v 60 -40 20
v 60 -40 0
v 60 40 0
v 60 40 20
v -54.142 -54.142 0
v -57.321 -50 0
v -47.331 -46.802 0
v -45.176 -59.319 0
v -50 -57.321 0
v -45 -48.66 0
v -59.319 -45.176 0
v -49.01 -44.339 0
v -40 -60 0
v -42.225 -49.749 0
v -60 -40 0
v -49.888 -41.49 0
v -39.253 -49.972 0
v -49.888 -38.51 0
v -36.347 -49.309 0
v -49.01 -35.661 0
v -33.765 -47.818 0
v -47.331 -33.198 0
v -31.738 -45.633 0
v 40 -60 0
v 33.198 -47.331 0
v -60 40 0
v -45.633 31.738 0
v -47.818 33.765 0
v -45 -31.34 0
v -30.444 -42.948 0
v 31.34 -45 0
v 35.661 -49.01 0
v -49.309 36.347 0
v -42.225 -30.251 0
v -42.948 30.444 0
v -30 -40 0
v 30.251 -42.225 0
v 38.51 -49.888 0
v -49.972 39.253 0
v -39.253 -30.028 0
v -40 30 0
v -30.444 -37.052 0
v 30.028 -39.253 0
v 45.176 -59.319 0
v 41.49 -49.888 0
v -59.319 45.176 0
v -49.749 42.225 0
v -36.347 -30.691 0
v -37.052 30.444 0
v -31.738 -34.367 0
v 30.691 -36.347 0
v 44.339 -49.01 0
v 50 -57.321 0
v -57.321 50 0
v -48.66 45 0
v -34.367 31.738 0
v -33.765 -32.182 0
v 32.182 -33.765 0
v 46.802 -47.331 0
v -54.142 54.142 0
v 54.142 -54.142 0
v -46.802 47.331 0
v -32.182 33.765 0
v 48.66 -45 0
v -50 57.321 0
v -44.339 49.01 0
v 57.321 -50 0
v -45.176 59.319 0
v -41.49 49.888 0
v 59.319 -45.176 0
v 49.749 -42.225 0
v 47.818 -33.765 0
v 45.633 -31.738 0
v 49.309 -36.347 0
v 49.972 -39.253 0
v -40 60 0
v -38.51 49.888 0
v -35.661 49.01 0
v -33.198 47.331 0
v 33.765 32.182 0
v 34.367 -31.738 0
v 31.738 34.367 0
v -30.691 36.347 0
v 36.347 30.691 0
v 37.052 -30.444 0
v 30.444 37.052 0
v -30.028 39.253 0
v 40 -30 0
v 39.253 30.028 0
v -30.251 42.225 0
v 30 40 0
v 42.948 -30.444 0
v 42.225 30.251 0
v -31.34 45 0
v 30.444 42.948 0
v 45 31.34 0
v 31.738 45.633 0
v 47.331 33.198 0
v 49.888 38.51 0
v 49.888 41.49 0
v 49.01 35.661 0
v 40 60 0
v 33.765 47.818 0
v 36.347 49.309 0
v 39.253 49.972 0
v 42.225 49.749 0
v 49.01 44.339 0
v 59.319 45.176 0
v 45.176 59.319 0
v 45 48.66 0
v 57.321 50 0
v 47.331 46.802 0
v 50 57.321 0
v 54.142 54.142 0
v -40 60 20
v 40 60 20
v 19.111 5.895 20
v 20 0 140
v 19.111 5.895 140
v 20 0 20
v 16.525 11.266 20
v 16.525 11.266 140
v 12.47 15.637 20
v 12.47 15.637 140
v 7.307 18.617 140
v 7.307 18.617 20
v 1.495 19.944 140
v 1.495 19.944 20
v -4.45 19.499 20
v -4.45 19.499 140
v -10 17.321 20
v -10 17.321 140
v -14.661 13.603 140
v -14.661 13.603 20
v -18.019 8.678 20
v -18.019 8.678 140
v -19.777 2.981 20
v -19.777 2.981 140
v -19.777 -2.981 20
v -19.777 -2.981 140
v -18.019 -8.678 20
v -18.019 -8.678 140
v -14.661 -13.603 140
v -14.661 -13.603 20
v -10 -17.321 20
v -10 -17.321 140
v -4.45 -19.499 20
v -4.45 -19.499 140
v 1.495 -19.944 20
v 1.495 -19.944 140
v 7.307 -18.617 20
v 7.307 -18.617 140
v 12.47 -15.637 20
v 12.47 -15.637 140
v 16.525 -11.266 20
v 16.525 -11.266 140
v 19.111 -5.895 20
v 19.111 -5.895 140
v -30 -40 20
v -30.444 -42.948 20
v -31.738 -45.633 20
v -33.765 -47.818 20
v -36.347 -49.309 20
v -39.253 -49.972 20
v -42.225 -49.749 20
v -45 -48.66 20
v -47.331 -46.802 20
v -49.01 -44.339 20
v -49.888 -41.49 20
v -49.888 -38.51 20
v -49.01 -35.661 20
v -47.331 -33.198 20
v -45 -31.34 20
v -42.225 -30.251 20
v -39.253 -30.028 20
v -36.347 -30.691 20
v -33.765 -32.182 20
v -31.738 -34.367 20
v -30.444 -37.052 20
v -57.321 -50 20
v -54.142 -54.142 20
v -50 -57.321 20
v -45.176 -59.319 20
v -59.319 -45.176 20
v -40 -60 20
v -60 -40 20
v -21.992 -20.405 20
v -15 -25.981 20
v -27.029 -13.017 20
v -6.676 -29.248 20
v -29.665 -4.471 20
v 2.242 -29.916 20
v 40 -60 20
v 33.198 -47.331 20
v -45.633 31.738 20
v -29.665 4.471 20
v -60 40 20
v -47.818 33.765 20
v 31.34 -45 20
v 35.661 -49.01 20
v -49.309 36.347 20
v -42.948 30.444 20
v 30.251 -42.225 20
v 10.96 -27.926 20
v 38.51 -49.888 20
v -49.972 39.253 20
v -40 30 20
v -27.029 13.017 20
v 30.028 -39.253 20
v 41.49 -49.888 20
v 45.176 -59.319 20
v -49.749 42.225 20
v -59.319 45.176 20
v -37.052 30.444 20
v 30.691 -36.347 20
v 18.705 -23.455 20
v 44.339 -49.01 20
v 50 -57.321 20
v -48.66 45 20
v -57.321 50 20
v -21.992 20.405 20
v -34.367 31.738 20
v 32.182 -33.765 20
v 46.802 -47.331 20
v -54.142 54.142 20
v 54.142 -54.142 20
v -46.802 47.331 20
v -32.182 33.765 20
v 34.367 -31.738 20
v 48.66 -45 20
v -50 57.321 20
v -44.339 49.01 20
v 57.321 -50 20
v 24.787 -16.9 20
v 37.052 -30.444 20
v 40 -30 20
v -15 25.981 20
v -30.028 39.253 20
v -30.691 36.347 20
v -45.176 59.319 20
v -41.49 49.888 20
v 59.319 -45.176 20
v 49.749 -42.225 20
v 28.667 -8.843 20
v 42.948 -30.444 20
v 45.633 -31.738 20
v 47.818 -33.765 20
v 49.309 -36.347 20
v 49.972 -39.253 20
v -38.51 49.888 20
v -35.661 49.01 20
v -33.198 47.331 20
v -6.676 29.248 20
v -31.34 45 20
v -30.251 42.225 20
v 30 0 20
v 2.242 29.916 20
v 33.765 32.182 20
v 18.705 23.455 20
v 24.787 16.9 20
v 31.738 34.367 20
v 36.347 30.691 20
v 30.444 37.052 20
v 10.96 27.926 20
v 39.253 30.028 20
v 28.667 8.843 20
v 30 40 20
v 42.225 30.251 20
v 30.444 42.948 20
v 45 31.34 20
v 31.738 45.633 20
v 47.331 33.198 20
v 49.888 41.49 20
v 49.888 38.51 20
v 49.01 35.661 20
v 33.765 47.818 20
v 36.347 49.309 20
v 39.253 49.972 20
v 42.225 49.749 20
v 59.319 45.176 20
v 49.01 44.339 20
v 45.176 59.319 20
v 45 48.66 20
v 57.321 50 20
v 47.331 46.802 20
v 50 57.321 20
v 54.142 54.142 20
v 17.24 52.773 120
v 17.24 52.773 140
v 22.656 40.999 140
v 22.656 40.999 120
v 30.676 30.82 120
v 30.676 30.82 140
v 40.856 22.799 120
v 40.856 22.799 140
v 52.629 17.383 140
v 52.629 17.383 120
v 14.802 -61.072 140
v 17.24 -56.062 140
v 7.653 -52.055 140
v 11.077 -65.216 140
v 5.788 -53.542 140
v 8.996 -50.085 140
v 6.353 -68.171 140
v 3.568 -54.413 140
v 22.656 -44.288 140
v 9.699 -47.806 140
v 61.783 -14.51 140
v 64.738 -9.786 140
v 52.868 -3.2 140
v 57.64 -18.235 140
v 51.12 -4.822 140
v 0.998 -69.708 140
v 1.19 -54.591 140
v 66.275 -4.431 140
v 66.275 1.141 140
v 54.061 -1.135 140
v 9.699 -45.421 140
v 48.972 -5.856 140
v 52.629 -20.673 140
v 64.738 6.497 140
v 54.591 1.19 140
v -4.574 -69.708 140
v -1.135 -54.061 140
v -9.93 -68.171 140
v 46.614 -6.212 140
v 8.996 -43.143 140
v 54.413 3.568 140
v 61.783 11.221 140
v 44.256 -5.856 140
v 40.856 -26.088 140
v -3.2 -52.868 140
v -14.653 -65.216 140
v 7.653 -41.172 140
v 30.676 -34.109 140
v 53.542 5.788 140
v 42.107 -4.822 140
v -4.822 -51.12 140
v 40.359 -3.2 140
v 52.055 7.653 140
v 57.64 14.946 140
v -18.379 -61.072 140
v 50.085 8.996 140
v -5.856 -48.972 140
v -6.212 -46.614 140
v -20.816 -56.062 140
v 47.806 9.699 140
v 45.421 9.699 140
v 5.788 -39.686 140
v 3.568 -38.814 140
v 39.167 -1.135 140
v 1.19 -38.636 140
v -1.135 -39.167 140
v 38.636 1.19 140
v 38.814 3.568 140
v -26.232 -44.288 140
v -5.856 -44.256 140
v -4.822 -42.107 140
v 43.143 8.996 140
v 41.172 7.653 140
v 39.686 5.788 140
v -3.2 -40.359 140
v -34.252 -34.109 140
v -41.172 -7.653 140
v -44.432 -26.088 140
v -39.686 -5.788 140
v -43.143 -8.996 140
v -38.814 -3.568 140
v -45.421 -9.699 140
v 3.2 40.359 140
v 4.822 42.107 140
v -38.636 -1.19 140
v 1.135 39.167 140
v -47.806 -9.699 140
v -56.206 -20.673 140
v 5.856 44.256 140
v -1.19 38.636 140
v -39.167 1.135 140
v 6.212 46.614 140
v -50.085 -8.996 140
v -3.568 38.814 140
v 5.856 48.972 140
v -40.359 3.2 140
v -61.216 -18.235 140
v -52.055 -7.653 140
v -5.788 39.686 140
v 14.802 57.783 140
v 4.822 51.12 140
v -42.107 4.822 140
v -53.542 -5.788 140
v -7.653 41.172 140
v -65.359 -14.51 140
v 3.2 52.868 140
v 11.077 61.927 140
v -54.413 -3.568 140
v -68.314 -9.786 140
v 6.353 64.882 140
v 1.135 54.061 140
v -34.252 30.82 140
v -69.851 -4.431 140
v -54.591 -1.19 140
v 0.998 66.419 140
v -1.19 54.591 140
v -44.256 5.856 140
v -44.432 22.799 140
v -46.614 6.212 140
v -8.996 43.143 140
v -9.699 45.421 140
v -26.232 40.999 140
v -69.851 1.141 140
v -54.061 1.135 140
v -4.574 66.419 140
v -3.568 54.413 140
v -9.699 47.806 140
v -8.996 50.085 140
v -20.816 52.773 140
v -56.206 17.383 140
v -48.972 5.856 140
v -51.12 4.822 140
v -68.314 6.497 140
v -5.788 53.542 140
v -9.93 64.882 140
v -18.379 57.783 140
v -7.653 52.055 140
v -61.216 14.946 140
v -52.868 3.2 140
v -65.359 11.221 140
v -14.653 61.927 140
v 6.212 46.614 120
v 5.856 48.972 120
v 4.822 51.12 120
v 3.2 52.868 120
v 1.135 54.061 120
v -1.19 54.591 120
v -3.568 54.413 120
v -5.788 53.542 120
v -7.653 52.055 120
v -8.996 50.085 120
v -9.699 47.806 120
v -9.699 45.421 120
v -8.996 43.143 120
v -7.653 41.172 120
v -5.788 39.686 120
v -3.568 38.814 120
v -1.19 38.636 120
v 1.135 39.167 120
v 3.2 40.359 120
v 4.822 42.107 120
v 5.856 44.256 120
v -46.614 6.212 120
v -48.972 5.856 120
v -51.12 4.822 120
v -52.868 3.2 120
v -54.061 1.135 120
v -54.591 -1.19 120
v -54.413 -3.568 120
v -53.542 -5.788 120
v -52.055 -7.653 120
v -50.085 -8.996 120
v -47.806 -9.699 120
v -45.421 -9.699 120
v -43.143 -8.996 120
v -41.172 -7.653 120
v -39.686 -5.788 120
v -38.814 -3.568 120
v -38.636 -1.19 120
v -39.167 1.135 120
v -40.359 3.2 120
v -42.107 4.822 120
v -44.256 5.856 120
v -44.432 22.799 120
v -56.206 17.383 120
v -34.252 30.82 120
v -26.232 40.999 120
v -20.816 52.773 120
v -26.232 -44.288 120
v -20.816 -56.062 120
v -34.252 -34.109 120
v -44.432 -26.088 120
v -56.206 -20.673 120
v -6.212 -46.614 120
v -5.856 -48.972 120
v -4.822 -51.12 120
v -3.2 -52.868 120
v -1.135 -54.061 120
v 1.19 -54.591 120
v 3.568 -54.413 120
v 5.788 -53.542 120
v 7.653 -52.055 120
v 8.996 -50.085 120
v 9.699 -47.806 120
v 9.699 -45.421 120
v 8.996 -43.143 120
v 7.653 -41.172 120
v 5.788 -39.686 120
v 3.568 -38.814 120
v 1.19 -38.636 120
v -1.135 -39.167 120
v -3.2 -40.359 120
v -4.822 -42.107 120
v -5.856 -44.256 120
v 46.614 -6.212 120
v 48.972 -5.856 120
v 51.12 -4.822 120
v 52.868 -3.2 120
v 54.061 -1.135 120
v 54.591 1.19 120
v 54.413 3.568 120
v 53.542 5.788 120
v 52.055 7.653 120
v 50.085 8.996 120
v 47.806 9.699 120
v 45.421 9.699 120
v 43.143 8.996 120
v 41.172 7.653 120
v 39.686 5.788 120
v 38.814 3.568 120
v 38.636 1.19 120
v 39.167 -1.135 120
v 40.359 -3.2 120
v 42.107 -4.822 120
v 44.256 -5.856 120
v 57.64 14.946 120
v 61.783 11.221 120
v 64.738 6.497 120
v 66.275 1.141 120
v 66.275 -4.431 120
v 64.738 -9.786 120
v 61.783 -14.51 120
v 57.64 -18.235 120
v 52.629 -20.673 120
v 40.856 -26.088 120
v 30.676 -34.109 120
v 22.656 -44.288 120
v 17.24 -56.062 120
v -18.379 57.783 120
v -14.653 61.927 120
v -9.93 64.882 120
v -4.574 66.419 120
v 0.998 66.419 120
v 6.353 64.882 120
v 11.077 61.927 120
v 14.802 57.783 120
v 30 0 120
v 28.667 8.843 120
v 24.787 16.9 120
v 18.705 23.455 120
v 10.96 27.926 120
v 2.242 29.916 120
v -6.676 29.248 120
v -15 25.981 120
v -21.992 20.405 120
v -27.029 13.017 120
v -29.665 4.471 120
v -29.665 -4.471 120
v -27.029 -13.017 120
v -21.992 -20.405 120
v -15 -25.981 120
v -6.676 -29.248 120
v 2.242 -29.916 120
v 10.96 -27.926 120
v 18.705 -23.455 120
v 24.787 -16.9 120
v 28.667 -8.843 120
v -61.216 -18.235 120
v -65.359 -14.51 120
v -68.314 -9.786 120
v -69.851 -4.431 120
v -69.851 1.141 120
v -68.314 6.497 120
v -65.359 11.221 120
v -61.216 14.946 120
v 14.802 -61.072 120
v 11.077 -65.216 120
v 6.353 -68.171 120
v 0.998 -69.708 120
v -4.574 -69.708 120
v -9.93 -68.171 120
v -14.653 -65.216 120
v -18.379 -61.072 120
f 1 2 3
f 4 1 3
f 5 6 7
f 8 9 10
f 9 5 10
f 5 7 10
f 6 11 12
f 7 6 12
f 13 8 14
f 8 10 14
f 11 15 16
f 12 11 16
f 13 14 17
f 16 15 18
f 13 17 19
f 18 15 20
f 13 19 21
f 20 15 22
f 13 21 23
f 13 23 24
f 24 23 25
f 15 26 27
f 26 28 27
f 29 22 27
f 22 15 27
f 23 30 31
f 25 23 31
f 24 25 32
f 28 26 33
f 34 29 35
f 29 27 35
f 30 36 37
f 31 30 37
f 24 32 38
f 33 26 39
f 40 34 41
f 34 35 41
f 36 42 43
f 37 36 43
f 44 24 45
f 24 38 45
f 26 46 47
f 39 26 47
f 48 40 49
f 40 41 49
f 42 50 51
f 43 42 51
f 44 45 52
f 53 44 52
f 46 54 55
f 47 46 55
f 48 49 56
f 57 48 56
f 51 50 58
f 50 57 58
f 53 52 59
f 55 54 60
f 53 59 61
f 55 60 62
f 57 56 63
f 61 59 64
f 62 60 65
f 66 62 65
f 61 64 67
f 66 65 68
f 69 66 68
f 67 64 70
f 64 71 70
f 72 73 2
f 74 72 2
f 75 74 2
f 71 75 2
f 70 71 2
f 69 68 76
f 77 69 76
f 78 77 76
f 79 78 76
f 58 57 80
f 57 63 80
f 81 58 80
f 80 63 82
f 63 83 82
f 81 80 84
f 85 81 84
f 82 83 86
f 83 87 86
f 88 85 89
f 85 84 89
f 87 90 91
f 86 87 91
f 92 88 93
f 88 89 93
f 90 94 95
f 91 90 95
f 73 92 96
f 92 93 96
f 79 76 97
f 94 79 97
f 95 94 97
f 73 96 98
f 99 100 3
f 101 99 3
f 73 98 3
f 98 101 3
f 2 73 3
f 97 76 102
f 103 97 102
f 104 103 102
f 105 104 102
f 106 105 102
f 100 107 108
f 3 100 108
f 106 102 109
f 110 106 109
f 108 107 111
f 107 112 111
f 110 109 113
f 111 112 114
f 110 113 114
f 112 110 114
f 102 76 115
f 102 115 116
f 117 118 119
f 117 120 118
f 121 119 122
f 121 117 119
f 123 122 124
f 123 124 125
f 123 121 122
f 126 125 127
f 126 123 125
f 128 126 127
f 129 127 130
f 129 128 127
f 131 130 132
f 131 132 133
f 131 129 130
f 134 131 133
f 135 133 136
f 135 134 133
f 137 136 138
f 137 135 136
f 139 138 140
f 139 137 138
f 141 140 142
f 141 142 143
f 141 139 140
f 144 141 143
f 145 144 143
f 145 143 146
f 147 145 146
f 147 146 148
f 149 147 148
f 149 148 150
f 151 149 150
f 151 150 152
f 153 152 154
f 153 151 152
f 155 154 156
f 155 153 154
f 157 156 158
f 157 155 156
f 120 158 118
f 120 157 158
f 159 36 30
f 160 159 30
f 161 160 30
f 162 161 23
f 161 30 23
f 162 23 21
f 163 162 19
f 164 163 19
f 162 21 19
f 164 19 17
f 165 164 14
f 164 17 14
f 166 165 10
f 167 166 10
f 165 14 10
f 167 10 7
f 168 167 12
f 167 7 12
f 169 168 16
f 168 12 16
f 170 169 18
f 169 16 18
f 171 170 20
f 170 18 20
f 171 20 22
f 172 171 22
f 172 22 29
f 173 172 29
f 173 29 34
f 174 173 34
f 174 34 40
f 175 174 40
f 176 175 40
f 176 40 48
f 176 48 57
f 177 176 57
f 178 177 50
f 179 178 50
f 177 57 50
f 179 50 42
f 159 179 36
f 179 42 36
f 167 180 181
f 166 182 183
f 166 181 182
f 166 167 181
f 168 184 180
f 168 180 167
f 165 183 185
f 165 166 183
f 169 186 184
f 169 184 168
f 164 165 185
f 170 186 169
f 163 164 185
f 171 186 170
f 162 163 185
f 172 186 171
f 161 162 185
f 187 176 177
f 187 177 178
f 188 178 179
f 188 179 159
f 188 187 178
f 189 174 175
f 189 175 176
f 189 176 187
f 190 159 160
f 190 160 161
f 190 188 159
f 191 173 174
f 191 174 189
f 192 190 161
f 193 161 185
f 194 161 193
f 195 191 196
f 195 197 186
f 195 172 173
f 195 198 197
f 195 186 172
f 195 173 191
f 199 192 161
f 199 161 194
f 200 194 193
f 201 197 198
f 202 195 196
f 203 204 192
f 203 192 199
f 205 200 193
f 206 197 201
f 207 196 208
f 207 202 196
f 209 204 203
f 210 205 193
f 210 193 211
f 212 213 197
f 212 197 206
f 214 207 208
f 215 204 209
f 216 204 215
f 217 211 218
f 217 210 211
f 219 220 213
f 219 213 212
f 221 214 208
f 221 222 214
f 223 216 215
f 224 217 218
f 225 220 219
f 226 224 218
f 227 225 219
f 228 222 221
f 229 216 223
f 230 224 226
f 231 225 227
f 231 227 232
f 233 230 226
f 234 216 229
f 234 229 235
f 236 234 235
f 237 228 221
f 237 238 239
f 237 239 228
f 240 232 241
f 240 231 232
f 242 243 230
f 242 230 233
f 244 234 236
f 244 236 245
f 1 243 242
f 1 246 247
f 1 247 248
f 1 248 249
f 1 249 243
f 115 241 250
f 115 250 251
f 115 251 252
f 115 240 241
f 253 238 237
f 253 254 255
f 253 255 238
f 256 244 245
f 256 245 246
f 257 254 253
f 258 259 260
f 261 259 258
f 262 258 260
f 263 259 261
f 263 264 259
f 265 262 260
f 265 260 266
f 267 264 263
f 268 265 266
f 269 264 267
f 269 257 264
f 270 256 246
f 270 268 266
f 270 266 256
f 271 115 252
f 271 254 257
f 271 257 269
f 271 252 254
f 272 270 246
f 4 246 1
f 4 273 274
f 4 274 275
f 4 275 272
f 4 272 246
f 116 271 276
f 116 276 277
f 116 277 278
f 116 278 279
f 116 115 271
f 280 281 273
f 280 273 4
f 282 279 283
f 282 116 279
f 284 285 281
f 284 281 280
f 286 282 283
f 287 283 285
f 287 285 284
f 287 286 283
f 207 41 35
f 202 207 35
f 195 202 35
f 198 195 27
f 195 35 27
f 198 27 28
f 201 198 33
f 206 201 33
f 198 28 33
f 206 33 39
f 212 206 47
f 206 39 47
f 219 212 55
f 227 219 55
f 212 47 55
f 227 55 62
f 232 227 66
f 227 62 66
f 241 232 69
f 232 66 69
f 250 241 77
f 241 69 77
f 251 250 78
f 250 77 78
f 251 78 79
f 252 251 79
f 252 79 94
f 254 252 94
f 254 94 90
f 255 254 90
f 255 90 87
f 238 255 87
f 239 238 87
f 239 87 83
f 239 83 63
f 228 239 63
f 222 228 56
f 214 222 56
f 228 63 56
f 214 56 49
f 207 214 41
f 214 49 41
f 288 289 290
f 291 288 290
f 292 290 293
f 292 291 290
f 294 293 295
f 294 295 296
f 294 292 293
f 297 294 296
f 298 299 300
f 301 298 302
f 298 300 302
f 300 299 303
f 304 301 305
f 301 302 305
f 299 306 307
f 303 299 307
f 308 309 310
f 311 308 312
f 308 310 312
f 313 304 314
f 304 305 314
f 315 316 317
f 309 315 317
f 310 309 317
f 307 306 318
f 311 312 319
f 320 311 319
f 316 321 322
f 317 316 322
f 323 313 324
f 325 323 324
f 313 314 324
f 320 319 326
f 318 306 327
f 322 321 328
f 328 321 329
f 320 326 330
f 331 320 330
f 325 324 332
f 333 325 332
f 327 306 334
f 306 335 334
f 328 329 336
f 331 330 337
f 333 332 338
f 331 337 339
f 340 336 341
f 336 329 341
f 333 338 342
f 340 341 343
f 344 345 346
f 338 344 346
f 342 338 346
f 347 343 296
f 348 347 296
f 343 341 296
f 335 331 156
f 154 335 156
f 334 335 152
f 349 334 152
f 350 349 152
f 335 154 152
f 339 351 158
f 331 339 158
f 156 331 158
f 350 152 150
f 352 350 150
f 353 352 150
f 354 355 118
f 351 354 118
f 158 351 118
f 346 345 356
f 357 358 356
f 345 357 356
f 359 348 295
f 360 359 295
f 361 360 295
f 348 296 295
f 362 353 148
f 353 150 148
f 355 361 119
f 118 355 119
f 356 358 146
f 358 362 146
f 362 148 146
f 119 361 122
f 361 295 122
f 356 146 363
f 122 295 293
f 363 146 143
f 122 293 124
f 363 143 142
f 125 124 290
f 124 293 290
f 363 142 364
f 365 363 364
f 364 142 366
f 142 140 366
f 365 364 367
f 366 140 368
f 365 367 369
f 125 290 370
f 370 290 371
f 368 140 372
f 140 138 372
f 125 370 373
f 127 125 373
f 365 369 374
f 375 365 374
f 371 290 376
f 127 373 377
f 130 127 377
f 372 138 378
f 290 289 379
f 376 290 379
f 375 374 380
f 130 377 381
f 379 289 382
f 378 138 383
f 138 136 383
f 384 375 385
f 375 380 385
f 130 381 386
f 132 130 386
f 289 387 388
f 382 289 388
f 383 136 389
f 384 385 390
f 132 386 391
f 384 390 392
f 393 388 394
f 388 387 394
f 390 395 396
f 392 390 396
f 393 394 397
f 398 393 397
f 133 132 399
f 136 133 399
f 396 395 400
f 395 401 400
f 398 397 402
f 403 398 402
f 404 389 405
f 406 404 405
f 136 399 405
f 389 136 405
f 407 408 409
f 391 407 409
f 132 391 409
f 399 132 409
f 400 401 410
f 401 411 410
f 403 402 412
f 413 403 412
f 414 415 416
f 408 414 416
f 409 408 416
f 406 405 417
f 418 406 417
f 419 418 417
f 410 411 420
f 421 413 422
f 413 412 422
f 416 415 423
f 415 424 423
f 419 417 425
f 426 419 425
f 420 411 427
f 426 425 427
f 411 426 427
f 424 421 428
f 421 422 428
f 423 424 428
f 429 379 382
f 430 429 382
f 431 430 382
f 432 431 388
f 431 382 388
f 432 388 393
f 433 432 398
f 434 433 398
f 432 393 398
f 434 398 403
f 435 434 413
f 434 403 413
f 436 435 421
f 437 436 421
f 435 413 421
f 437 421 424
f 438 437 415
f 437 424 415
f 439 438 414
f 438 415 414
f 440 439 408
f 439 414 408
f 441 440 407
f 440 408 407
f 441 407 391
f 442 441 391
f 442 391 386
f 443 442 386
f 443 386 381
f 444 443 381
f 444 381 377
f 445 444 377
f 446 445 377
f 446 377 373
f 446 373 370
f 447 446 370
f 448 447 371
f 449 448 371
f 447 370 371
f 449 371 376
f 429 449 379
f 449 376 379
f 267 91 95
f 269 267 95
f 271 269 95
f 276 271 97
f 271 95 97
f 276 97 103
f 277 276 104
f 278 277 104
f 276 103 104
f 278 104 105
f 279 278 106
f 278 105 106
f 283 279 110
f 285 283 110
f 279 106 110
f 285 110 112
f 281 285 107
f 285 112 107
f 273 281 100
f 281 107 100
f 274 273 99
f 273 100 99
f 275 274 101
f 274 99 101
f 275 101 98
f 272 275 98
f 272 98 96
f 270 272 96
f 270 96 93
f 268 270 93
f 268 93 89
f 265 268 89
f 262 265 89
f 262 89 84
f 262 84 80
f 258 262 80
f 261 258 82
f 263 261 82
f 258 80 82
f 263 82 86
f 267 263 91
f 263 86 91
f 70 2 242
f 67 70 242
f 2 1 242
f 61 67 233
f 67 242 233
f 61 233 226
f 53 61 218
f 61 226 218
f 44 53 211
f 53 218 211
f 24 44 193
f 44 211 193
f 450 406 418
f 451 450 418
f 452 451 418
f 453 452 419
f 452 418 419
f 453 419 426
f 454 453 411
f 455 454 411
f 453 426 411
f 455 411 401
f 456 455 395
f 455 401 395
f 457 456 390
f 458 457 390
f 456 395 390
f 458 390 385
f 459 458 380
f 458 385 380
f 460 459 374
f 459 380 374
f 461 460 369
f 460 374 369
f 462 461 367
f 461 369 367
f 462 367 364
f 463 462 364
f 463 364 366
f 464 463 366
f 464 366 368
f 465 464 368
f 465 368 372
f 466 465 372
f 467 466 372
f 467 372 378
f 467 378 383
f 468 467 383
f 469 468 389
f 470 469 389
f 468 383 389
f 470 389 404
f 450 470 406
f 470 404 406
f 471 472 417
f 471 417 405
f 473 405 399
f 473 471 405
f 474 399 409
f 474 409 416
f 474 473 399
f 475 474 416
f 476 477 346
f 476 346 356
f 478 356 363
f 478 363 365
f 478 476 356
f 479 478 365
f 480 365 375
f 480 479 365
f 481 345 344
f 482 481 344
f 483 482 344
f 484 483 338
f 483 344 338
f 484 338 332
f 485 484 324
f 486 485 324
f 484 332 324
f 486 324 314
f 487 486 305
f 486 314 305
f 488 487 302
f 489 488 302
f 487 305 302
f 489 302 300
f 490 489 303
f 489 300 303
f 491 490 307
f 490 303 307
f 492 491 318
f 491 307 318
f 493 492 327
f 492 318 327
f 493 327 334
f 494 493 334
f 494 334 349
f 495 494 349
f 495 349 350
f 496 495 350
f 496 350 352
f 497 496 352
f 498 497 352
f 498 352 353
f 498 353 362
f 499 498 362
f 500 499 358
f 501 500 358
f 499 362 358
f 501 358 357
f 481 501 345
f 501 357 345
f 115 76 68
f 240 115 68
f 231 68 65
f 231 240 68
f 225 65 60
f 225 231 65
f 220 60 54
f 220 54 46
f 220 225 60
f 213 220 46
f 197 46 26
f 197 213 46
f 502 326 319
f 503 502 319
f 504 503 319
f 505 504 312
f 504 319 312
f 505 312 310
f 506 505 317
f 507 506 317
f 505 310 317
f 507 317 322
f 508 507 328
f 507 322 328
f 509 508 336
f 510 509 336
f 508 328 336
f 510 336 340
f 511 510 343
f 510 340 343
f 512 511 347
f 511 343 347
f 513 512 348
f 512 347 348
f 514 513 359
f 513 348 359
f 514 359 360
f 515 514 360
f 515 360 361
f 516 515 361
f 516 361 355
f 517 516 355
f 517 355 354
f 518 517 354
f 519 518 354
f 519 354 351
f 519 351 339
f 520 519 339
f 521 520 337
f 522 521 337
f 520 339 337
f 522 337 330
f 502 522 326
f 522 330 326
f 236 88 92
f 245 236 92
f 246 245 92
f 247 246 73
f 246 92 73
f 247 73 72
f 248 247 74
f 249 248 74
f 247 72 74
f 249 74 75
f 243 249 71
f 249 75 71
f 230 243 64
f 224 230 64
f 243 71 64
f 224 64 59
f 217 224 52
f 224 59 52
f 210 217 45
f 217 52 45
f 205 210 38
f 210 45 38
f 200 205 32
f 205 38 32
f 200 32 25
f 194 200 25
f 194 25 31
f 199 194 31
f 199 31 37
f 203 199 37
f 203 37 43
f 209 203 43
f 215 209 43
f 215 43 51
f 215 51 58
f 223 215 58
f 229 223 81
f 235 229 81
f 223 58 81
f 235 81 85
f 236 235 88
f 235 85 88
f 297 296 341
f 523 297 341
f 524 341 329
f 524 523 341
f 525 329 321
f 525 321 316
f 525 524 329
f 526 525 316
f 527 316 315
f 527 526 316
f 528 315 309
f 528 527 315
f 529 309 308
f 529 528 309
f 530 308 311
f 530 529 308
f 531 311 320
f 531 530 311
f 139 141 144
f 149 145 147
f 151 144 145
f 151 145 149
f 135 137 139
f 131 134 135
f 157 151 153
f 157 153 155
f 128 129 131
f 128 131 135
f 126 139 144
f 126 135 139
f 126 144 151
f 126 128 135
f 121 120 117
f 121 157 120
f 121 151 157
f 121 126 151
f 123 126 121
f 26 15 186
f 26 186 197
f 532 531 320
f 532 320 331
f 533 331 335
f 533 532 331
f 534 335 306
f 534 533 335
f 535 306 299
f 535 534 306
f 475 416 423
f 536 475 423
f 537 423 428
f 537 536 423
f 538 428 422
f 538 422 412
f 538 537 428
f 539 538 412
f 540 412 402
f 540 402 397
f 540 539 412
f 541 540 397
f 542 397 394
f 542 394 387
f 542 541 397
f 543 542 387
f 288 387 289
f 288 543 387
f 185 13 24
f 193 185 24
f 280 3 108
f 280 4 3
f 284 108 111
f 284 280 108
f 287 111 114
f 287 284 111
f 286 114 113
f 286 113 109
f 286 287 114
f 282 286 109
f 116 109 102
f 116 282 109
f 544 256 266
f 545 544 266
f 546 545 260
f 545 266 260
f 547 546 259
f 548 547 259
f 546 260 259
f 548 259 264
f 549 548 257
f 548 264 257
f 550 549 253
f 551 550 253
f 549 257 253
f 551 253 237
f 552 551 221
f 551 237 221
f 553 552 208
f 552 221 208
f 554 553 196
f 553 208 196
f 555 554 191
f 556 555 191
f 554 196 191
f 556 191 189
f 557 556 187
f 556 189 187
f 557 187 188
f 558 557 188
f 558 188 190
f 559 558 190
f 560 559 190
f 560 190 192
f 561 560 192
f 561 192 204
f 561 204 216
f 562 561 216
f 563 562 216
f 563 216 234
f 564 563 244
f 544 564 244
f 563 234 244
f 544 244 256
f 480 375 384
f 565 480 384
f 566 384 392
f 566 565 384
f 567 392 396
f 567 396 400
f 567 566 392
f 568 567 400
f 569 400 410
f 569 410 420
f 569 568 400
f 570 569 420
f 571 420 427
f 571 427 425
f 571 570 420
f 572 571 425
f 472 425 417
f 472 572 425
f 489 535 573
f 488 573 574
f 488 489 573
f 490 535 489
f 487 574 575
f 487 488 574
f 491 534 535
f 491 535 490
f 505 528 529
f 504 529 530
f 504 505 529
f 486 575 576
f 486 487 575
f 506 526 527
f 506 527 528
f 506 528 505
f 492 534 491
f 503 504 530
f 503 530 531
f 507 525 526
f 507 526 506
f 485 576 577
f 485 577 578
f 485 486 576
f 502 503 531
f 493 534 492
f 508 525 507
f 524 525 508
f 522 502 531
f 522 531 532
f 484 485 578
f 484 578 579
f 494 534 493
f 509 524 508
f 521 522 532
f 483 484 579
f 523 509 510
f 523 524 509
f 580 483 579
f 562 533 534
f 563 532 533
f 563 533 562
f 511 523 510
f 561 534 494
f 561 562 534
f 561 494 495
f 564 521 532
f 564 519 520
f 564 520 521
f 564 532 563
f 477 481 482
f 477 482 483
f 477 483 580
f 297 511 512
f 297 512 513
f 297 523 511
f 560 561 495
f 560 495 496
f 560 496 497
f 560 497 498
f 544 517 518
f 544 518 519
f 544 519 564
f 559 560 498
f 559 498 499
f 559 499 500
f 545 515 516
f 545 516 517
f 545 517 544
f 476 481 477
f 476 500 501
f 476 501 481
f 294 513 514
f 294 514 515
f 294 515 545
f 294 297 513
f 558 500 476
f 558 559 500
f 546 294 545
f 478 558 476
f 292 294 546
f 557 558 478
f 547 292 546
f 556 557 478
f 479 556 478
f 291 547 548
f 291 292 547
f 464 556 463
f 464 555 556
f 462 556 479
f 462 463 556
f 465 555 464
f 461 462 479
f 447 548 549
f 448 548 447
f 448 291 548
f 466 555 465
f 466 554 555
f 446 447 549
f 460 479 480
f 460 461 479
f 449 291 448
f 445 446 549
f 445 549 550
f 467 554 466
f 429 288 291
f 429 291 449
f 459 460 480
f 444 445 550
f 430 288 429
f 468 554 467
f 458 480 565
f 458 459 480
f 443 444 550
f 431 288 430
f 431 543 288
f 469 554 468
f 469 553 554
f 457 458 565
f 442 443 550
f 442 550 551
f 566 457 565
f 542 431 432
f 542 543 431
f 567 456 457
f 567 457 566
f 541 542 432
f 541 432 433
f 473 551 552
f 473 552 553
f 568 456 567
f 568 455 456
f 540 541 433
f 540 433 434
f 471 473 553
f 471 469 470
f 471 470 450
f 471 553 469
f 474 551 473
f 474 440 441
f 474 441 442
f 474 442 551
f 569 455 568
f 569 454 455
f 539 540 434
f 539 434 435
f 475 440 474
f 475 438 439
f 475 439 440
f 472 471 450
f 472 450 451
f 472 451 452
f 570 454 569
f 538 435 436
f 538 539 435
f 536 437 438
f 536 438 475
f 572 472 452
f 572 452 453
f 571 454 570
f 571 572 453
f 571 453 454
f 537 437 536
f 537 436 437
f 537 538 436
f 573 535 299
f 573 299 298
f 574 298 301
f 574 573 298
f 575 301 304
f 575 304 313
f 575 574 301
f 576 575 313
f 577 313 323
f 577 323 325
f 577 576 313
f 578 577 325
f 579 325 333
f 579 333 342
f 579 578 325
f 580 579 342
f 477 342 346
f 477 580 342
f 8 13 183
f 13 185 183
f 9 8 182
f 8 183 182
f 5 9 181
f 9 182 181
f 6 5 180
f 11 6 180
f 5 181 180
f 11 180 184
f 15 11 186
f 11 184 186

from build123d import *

# Parameters (mm, degrees)
SCHIZZO1_W                   = 120
SCHIZZO1_H                   = 120
ESTRUSIONE_ESTRUSIONE1_DEPTH = 20
SCHIZZO3_R                   = 30
SCHIZZO3_R_2                 = 20
ESTRUSIONE_ESTRUSIONE2_DEPTH = 100
SCHIZZO4_R                   = 20
ESTRUSIONE_ESTRUSIONE3_DEPTH = 20
RACCORDO2_R                  = 20
SCHIZZO8_R                   = 8
TAGLIO_ESTRUSIONE1_DEPTH     = 20
SCHIZZO7_R                   = 10
TAGLIO_ESTRUSIONE2_DEPTH     = 20
RIPETIZIONECIRCOLARE1_COUNT  = 4


with BuildPart() as part:
    # Schizzo1 → Estrusione-Estrusione1 (new body)
    with BuildSketch(Plane.XY):
        Rectangle(SCHIZZO1_W, SCHIZZO1_H)
    extrude(amount=ESTRUSIONE_ESTRUSIONE1_DEPTH)

    # Schizzo3 → Estrusione-Estrusione2 (add)
    with BuildSketch(Plane.XY.offset(20)):
        Circle(SCHIZZO3_R)
        Circle(SCHIZZO3_R_2, mode=Mode.SUBTRACT)
    extrude(amount=ESTRUSIONE_ESTRUSIONE2_DEPTH)

    # Schizzo4 → Estrusione-Estrusione3 (add)
    with BuildSketch(Plane.XY.offset(120)):
        with BuildLine():
            ThreePointArc((-56.205527859, 17.383404463), (-34.252252481, 30.819558816), (-20.816098128, 52.772834194))
            ThreePointArc((-20.816098128, 52.772834194), (-1.788088194, 66.613707799), (17.23992174, 52.772834194))
            ThreePointArc((17.23992174, 52.772834194), (30.676076093, 30.819558816), (52.629351472, 17.383404463))
            ThreePointArc((52.629351472, 17.383404463), (66.470225076, -1.644605471), (52.629351472, -20.672615405))
            ThreePointArc((52.629351472, -20.672615405), (30.676076093, -34.108769758), (17.23992174, -56.062045137))
            ThreePointArc((17.23992174, -56.062045137), (-1.788088194, -69.902918741), (-20.816098128, -56.062045137))
            ThreePointArc((-20.816098128, -56.062045137), (-34.252252481, -34.108769758), (-56.205527859, -20.672615405))
            ThreePointArc((-56.205527859, -20.672615405), (-70.046401464, -1.644605471), (-56.205527859, 17.383404463))
        make_face()
        Circle(SCHIZZO4_R, mode=Mode.SUBTRACT)
    extrude(amount=ESTRUSIONE_ESTRUSIONE3_DEPTH)

    # Raccordo2
    raccordo2_edges = [part.edges().sort_by_distance(p)[0] for p in [
        (-60, 60, 10),
        (60, 60, 10),
        (60, -60, 10),
        (-60, -60, 10),
    ]]
    fillet(raccordo2_edges, radius=RACCORDO2_R)

    # Schizzo8 → Taglio-Estrusione1 (cut)
    with BuildSketch(Plane.XY.offset(140)):
        with Locations((-1.788088194, 46.613707799)):
            Circle(SCHIZZO8_R)
    taglio_estrusione1 = extrude(amount=-TAGLIO_ESTRUSIONE1_DEPTH, mode=Mode.SUBTRACT)

    # Schizzo7 → Taglio-Estrusione2 (cut)
    with BuildSketch(Plane(origin=(0, 0, 0), x_dir=(-1, 0, 0), z_dir=(0, 0, -1))):
        with Locations((-40, 40)):
            Circle(SCHIZZO7_R)
    taglio_estrusione2 = extrude(amount=-TAGLIO_ESTRUSIONE2_DEPTH, mode=Mode.SUBTRACT)

    # RipetizioneCircolare1: Taglio-Estrusione1, Taglio-Estrusione2 ×4 about axis
    ripetizionecircolare1_axis = Axis((0, 0, 0), (0, 0, 1))
    for i in range(1, RIPETIZIONECIRCOLARE1_COUNT):
        add(taglio_estrusione1.rotate(ripetizionecircolare1_axis, i * 360 / RIPETIZIONECIRCOLARE1_COUNT), mode=Mode.SUBTRACT)
        add(taglio_estrusione2.rotate(ripetizionecircolare1_axis, i * 360 / RIPETIZIONECIRCOLARE1_COUNT), mode=Mode.SUBTRACT)


solid = part.part
